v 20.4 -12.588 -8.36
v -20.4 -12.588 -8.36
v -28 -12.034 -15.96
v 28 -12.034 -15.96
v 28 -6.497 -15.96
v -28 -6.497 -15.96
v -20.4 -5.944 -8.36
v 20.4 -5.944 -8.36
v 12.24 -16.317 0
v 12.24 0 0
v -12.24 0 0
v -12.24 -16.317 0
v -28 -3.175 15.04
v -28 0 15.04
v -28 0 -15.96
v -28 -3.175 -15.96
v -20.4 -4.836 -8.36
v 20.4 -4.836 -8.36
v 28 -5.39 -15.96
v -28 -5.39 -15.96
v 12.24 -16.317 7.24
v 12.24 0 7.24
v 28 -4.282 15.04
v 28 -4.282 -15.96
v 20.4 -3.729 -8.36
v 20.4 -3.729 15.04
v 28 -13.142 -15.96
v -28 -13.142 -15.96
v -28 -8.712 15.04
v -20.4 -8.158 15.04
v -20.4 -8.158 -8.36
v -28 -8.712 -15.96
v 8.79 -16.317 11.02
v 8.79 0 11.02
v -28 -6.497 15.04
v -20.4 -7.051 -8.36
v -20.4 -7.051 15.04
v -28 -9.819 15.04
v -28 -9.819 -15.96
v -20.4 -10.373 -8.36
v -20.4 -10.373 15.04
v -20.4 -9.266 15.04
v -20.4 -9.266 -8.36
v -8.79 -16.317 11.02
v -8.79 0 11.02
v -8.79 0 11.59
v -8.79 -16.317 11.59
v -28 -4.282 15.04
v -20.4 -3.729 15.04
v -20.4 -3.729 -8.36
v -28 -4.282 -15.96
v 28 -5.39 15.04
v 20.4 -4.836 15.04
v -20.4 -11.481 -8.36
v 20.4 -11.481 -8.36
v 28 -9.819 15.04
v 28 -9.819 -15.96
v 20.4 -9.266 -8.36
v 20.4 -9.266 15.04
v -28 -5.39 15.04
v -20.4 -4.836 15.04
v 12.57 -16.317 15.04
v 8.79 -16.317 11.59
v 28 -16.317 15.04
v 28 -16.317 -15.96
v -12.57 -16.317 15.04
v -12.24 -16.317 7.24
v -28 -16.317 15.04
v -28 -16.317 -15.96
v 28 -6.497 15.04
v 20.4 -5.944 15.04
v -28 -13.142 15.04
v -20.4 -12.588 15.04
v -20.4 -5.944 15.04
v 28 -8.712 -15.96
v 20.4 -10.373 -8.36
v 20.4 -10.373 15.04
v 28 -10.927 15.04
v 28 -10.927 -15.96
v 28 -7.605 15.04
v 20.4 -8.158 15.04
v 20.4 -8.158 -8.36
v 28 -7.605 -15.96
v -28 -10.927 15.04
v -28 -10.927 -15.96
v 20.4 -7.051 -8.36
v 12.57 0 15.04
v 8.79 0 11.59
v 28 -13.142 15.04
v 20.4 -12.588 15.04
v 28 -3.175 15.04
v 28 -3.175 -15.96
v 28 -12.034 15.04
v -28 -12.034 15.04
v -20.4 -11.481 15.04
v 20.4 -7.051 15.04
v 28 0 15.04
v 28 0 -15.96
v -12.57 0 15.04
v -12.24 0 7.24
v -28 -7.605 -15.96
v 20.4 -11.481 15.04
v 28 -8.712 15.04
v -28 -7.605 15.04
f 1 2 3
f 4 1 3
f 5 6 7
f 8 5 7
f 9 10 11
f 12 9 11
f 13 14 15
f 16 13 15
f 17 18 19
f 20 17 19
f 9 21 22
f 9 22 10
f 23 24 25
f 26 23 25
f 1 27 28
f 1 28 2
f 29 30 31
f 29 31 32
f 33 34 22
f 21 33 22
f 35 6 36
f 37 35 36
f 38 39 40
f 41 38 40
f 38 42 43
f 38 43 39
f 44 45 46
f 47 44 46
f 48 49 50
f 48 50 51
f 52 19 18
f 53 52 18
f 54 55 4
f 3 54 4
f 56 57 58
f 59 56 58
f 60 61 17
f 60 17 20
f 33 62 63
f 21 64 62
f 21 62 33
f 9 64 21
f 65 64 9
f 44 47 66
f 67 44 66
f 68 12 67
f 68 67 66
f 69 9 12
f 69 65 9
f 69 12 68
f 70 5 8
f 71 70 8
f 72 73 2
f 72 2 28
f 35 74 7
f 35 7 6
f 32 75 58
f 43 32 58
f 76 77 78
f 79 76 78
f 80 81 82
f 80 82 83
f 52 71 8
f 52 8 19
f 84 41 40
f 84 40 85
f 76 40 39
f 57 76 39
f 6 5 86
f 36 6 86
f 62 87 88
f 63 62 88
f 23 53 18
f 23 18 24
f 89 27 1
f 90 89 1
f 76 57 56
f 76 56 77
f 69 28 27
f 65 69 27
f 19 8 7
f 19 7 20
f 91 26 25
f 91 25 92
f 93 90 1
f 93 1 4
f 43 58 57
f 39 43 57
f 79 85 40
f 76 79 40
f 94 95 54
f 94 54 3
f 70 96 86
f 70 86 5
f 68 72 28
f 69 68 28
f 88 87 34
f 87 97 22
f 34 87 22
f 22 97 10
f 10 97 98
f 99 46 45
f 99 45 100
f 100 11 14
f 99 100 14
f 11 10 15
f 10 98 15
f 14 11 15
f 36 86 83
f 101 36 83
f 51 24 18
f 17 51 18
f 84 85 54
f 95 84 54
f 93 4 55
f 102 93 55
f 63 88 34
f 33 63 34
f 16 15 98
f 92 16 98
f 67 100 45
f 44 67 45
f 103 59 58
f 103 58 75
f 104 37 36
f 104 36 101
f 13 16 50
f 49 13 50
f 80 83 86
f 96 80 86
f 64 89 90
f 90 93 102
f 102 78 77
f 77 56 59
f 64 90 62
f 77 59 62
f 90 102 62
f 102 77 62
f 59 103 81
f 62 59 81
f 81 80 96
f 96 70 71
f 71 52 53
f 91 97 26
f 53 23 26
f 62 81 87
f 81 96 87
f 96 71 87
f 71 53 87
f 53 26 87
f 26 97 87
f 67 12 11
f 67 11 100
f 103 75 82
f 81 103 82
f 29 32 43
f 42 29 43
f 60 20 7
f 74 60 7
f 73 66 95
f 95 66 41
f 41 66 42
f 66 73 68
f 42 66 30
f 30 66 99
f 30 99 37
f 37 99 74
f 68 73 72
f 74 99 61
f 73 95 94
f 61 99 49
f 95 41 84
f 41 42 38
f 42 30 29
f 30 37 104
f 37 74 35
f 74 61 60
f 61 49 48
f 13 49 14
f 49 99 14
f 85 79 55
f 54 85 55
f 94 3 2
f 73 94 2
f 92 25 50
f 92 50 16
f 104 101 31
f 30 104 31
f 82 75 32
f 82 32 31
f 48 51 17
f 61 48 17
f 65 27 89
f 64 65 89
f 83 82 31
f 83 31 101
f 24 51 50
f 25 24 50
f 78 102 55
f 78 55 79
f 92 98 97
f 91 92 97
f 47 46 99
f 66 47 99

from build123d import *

# Parameters (mm, degrees)
BOSS_EXTRUDE1_DEPTH     = 16.316743
CUT_EXTRUDE1_DEPTH      = 16.04
CUT_EXTRUDE1_DEPTH_BACK = 16.96
CUT_EXTRUDE2_DEPTH      = 29
CUT_EXTRUDE2_DEPTH_BACK = 29


with BuildPart() as part:
    # Sketch3 → Boss-Extrude1 (new body)
    with BuildSketch(Plane(origin=(0, 0, 0), x_dir=(1, 0, 0), z_dir=(0, 1, 0))):
        Polygon((-28, 15.96), (28, 15.96), (28, -15.04), (12.57, -15.04), (8.79, -11.59), (8.79, -11.02), (12.24, -7.24), (12.24, 0), (-12.24, 0), (-12.24, -7.24), (-8.79, -11.02), (-8.79, -11.59), (-12.57, -15.04), (-28, -15.04), align=None)
    extrude(amount=-BOSS_EXTRUDE1_DEPTH)

    # Sketch4 → Cut-Extrude1 (cut, two sides)
    with BuildSketch(Plane.XY) as cut_extrude1_sk:
        Polygon((28, -3.175), (28, -4.282415891), (20.400144244, -3.728707945), align=None)
        Polygon((28, -4.282415891), (28, -5.389831781), (20.400144244, -4.836123836), align=None)
        Polygon((28, -5.389831781), (28, -6.497247672), (20.400144244, -5.943539726), align=None)
        Polygon((28, -6.497247672), (28, -7.604663562), (20.400144244, -7.050955617), align=None)
        Polygon((28, -7.604663562), (28, -8.712079453), (20.400144244, -8.158371507), align=None)
        Polygon((28, -8.712079453), (28, -9.819495343), (20.400144244, -9.265787398), align=None)
        Polygon((20.400144244, -10.373203288), (28, -10.926911234), (28, -9.819495343), align=None)
        Polygon((28, -10.926911234), (28, -12.034327124), (20.400144244, -11.480619179), align=None)
        Polygon((28, -12.034327124), (28, -13.141743015), (20.400144244, -12.588035069), align=None)
        Polygon((-28, -13.141743015), (-28, -12.034327124), (-20.400144244, -12.588035069), align=None)
        Polygon((-28, -10.926911234), (-20.400144244, -11.480619179), (-28, -12.034327124), align=None)
        Polygon((-28, -10.926911234), (-28, -9.819495343), (-20.400144244, -10.373203288), align=None)
        Polygon((-28, -8.712079453), (-20.400144244, -9.265787398), (-28, -9.819495343), align=None)
        Polygon((-28, -7.604663562), (-20.400144244, -8.158371507), (-28, -8.712079453), align=None)
        Polygon((-28, -6.497247672), (-20.400144244, -7.050955617), (-28, -7.604663562), align=None)
        Polygon((-28, -5.389831781), (-20.400144244, -5.943539726), (-28, -6.497247672), align=None)
        Polygon((-28, -4.282415891), (-20.400144244, -4.836123836), (-28, -5.389831781), align=None)
        Polygon((-28, -3.175), (-20.400144244, -3.728707945), (-28, -4.282415891), align=None)
    extrude(amount=CUT_EXTRUDE1_DEPTH, mode=Mode.SUBTRACT)
    extrude(cut_extrude1_sk.sketch, amount=-CUT_EXTRUDE1_DEPTH_BACK, mode=Mode.SUBTRACT)

    # Sketch5 → Cut-Extrude2 (cut, two sides)
    with BuildSketch(Plane(origin=(0, 0, 0), x_dir=(0, 0, -1), z_dir=(1, 0, 0))) as cut_extrude2_sk:
        Polygon((15.96, -3.175), (15.96, -4.282415891), (8.360144244, -3.728707945), align=None)
        Polygon((8.360144244, -4.836123836), (15.96, -5.389831781), (15.96, -4.282415891), align=None)
        Polygon((15.96, -5.389831781), (15.96, -6.497247672), (8.360144244, -5.943539726), align=None)
        Polygon((8.360144244, -7.050955617), (15.96, -7.604663562), (15.96, -6.497247672), align=None)
        Polygon((15.96, -7.604663562), (15.96, -8.712079453), (8.360144244, -8.158371507), align=None)
        Polygon((8.360144244, -9.265787398), (15.96, -9.819495343), (15.96, -8.712079453), align=None)
        Polygon((15.96, -9.819495343), (15.96, -10.926911234), (8.360144244, -10.373203288), align=None)
        Polygon((8.360144244, -11.480619179), (15.96, -12.034327124), (15.96, -10.926911234), align=None)
        Polygon((15.96, -12.034327124), (15.96, -13.141743015), (8.360144244, -12.588035069), align=None)
    extrude(amount=CUT_EXTRUDE2_DEPTH, mode=Mode.SUBTRACT)
    extrude(cut_extrude2_sk.sketch, amount=-CUT_EXTRUDE2_DEPTH_BACK, mode=Mode.SUBTRACT)


solid = part.part
